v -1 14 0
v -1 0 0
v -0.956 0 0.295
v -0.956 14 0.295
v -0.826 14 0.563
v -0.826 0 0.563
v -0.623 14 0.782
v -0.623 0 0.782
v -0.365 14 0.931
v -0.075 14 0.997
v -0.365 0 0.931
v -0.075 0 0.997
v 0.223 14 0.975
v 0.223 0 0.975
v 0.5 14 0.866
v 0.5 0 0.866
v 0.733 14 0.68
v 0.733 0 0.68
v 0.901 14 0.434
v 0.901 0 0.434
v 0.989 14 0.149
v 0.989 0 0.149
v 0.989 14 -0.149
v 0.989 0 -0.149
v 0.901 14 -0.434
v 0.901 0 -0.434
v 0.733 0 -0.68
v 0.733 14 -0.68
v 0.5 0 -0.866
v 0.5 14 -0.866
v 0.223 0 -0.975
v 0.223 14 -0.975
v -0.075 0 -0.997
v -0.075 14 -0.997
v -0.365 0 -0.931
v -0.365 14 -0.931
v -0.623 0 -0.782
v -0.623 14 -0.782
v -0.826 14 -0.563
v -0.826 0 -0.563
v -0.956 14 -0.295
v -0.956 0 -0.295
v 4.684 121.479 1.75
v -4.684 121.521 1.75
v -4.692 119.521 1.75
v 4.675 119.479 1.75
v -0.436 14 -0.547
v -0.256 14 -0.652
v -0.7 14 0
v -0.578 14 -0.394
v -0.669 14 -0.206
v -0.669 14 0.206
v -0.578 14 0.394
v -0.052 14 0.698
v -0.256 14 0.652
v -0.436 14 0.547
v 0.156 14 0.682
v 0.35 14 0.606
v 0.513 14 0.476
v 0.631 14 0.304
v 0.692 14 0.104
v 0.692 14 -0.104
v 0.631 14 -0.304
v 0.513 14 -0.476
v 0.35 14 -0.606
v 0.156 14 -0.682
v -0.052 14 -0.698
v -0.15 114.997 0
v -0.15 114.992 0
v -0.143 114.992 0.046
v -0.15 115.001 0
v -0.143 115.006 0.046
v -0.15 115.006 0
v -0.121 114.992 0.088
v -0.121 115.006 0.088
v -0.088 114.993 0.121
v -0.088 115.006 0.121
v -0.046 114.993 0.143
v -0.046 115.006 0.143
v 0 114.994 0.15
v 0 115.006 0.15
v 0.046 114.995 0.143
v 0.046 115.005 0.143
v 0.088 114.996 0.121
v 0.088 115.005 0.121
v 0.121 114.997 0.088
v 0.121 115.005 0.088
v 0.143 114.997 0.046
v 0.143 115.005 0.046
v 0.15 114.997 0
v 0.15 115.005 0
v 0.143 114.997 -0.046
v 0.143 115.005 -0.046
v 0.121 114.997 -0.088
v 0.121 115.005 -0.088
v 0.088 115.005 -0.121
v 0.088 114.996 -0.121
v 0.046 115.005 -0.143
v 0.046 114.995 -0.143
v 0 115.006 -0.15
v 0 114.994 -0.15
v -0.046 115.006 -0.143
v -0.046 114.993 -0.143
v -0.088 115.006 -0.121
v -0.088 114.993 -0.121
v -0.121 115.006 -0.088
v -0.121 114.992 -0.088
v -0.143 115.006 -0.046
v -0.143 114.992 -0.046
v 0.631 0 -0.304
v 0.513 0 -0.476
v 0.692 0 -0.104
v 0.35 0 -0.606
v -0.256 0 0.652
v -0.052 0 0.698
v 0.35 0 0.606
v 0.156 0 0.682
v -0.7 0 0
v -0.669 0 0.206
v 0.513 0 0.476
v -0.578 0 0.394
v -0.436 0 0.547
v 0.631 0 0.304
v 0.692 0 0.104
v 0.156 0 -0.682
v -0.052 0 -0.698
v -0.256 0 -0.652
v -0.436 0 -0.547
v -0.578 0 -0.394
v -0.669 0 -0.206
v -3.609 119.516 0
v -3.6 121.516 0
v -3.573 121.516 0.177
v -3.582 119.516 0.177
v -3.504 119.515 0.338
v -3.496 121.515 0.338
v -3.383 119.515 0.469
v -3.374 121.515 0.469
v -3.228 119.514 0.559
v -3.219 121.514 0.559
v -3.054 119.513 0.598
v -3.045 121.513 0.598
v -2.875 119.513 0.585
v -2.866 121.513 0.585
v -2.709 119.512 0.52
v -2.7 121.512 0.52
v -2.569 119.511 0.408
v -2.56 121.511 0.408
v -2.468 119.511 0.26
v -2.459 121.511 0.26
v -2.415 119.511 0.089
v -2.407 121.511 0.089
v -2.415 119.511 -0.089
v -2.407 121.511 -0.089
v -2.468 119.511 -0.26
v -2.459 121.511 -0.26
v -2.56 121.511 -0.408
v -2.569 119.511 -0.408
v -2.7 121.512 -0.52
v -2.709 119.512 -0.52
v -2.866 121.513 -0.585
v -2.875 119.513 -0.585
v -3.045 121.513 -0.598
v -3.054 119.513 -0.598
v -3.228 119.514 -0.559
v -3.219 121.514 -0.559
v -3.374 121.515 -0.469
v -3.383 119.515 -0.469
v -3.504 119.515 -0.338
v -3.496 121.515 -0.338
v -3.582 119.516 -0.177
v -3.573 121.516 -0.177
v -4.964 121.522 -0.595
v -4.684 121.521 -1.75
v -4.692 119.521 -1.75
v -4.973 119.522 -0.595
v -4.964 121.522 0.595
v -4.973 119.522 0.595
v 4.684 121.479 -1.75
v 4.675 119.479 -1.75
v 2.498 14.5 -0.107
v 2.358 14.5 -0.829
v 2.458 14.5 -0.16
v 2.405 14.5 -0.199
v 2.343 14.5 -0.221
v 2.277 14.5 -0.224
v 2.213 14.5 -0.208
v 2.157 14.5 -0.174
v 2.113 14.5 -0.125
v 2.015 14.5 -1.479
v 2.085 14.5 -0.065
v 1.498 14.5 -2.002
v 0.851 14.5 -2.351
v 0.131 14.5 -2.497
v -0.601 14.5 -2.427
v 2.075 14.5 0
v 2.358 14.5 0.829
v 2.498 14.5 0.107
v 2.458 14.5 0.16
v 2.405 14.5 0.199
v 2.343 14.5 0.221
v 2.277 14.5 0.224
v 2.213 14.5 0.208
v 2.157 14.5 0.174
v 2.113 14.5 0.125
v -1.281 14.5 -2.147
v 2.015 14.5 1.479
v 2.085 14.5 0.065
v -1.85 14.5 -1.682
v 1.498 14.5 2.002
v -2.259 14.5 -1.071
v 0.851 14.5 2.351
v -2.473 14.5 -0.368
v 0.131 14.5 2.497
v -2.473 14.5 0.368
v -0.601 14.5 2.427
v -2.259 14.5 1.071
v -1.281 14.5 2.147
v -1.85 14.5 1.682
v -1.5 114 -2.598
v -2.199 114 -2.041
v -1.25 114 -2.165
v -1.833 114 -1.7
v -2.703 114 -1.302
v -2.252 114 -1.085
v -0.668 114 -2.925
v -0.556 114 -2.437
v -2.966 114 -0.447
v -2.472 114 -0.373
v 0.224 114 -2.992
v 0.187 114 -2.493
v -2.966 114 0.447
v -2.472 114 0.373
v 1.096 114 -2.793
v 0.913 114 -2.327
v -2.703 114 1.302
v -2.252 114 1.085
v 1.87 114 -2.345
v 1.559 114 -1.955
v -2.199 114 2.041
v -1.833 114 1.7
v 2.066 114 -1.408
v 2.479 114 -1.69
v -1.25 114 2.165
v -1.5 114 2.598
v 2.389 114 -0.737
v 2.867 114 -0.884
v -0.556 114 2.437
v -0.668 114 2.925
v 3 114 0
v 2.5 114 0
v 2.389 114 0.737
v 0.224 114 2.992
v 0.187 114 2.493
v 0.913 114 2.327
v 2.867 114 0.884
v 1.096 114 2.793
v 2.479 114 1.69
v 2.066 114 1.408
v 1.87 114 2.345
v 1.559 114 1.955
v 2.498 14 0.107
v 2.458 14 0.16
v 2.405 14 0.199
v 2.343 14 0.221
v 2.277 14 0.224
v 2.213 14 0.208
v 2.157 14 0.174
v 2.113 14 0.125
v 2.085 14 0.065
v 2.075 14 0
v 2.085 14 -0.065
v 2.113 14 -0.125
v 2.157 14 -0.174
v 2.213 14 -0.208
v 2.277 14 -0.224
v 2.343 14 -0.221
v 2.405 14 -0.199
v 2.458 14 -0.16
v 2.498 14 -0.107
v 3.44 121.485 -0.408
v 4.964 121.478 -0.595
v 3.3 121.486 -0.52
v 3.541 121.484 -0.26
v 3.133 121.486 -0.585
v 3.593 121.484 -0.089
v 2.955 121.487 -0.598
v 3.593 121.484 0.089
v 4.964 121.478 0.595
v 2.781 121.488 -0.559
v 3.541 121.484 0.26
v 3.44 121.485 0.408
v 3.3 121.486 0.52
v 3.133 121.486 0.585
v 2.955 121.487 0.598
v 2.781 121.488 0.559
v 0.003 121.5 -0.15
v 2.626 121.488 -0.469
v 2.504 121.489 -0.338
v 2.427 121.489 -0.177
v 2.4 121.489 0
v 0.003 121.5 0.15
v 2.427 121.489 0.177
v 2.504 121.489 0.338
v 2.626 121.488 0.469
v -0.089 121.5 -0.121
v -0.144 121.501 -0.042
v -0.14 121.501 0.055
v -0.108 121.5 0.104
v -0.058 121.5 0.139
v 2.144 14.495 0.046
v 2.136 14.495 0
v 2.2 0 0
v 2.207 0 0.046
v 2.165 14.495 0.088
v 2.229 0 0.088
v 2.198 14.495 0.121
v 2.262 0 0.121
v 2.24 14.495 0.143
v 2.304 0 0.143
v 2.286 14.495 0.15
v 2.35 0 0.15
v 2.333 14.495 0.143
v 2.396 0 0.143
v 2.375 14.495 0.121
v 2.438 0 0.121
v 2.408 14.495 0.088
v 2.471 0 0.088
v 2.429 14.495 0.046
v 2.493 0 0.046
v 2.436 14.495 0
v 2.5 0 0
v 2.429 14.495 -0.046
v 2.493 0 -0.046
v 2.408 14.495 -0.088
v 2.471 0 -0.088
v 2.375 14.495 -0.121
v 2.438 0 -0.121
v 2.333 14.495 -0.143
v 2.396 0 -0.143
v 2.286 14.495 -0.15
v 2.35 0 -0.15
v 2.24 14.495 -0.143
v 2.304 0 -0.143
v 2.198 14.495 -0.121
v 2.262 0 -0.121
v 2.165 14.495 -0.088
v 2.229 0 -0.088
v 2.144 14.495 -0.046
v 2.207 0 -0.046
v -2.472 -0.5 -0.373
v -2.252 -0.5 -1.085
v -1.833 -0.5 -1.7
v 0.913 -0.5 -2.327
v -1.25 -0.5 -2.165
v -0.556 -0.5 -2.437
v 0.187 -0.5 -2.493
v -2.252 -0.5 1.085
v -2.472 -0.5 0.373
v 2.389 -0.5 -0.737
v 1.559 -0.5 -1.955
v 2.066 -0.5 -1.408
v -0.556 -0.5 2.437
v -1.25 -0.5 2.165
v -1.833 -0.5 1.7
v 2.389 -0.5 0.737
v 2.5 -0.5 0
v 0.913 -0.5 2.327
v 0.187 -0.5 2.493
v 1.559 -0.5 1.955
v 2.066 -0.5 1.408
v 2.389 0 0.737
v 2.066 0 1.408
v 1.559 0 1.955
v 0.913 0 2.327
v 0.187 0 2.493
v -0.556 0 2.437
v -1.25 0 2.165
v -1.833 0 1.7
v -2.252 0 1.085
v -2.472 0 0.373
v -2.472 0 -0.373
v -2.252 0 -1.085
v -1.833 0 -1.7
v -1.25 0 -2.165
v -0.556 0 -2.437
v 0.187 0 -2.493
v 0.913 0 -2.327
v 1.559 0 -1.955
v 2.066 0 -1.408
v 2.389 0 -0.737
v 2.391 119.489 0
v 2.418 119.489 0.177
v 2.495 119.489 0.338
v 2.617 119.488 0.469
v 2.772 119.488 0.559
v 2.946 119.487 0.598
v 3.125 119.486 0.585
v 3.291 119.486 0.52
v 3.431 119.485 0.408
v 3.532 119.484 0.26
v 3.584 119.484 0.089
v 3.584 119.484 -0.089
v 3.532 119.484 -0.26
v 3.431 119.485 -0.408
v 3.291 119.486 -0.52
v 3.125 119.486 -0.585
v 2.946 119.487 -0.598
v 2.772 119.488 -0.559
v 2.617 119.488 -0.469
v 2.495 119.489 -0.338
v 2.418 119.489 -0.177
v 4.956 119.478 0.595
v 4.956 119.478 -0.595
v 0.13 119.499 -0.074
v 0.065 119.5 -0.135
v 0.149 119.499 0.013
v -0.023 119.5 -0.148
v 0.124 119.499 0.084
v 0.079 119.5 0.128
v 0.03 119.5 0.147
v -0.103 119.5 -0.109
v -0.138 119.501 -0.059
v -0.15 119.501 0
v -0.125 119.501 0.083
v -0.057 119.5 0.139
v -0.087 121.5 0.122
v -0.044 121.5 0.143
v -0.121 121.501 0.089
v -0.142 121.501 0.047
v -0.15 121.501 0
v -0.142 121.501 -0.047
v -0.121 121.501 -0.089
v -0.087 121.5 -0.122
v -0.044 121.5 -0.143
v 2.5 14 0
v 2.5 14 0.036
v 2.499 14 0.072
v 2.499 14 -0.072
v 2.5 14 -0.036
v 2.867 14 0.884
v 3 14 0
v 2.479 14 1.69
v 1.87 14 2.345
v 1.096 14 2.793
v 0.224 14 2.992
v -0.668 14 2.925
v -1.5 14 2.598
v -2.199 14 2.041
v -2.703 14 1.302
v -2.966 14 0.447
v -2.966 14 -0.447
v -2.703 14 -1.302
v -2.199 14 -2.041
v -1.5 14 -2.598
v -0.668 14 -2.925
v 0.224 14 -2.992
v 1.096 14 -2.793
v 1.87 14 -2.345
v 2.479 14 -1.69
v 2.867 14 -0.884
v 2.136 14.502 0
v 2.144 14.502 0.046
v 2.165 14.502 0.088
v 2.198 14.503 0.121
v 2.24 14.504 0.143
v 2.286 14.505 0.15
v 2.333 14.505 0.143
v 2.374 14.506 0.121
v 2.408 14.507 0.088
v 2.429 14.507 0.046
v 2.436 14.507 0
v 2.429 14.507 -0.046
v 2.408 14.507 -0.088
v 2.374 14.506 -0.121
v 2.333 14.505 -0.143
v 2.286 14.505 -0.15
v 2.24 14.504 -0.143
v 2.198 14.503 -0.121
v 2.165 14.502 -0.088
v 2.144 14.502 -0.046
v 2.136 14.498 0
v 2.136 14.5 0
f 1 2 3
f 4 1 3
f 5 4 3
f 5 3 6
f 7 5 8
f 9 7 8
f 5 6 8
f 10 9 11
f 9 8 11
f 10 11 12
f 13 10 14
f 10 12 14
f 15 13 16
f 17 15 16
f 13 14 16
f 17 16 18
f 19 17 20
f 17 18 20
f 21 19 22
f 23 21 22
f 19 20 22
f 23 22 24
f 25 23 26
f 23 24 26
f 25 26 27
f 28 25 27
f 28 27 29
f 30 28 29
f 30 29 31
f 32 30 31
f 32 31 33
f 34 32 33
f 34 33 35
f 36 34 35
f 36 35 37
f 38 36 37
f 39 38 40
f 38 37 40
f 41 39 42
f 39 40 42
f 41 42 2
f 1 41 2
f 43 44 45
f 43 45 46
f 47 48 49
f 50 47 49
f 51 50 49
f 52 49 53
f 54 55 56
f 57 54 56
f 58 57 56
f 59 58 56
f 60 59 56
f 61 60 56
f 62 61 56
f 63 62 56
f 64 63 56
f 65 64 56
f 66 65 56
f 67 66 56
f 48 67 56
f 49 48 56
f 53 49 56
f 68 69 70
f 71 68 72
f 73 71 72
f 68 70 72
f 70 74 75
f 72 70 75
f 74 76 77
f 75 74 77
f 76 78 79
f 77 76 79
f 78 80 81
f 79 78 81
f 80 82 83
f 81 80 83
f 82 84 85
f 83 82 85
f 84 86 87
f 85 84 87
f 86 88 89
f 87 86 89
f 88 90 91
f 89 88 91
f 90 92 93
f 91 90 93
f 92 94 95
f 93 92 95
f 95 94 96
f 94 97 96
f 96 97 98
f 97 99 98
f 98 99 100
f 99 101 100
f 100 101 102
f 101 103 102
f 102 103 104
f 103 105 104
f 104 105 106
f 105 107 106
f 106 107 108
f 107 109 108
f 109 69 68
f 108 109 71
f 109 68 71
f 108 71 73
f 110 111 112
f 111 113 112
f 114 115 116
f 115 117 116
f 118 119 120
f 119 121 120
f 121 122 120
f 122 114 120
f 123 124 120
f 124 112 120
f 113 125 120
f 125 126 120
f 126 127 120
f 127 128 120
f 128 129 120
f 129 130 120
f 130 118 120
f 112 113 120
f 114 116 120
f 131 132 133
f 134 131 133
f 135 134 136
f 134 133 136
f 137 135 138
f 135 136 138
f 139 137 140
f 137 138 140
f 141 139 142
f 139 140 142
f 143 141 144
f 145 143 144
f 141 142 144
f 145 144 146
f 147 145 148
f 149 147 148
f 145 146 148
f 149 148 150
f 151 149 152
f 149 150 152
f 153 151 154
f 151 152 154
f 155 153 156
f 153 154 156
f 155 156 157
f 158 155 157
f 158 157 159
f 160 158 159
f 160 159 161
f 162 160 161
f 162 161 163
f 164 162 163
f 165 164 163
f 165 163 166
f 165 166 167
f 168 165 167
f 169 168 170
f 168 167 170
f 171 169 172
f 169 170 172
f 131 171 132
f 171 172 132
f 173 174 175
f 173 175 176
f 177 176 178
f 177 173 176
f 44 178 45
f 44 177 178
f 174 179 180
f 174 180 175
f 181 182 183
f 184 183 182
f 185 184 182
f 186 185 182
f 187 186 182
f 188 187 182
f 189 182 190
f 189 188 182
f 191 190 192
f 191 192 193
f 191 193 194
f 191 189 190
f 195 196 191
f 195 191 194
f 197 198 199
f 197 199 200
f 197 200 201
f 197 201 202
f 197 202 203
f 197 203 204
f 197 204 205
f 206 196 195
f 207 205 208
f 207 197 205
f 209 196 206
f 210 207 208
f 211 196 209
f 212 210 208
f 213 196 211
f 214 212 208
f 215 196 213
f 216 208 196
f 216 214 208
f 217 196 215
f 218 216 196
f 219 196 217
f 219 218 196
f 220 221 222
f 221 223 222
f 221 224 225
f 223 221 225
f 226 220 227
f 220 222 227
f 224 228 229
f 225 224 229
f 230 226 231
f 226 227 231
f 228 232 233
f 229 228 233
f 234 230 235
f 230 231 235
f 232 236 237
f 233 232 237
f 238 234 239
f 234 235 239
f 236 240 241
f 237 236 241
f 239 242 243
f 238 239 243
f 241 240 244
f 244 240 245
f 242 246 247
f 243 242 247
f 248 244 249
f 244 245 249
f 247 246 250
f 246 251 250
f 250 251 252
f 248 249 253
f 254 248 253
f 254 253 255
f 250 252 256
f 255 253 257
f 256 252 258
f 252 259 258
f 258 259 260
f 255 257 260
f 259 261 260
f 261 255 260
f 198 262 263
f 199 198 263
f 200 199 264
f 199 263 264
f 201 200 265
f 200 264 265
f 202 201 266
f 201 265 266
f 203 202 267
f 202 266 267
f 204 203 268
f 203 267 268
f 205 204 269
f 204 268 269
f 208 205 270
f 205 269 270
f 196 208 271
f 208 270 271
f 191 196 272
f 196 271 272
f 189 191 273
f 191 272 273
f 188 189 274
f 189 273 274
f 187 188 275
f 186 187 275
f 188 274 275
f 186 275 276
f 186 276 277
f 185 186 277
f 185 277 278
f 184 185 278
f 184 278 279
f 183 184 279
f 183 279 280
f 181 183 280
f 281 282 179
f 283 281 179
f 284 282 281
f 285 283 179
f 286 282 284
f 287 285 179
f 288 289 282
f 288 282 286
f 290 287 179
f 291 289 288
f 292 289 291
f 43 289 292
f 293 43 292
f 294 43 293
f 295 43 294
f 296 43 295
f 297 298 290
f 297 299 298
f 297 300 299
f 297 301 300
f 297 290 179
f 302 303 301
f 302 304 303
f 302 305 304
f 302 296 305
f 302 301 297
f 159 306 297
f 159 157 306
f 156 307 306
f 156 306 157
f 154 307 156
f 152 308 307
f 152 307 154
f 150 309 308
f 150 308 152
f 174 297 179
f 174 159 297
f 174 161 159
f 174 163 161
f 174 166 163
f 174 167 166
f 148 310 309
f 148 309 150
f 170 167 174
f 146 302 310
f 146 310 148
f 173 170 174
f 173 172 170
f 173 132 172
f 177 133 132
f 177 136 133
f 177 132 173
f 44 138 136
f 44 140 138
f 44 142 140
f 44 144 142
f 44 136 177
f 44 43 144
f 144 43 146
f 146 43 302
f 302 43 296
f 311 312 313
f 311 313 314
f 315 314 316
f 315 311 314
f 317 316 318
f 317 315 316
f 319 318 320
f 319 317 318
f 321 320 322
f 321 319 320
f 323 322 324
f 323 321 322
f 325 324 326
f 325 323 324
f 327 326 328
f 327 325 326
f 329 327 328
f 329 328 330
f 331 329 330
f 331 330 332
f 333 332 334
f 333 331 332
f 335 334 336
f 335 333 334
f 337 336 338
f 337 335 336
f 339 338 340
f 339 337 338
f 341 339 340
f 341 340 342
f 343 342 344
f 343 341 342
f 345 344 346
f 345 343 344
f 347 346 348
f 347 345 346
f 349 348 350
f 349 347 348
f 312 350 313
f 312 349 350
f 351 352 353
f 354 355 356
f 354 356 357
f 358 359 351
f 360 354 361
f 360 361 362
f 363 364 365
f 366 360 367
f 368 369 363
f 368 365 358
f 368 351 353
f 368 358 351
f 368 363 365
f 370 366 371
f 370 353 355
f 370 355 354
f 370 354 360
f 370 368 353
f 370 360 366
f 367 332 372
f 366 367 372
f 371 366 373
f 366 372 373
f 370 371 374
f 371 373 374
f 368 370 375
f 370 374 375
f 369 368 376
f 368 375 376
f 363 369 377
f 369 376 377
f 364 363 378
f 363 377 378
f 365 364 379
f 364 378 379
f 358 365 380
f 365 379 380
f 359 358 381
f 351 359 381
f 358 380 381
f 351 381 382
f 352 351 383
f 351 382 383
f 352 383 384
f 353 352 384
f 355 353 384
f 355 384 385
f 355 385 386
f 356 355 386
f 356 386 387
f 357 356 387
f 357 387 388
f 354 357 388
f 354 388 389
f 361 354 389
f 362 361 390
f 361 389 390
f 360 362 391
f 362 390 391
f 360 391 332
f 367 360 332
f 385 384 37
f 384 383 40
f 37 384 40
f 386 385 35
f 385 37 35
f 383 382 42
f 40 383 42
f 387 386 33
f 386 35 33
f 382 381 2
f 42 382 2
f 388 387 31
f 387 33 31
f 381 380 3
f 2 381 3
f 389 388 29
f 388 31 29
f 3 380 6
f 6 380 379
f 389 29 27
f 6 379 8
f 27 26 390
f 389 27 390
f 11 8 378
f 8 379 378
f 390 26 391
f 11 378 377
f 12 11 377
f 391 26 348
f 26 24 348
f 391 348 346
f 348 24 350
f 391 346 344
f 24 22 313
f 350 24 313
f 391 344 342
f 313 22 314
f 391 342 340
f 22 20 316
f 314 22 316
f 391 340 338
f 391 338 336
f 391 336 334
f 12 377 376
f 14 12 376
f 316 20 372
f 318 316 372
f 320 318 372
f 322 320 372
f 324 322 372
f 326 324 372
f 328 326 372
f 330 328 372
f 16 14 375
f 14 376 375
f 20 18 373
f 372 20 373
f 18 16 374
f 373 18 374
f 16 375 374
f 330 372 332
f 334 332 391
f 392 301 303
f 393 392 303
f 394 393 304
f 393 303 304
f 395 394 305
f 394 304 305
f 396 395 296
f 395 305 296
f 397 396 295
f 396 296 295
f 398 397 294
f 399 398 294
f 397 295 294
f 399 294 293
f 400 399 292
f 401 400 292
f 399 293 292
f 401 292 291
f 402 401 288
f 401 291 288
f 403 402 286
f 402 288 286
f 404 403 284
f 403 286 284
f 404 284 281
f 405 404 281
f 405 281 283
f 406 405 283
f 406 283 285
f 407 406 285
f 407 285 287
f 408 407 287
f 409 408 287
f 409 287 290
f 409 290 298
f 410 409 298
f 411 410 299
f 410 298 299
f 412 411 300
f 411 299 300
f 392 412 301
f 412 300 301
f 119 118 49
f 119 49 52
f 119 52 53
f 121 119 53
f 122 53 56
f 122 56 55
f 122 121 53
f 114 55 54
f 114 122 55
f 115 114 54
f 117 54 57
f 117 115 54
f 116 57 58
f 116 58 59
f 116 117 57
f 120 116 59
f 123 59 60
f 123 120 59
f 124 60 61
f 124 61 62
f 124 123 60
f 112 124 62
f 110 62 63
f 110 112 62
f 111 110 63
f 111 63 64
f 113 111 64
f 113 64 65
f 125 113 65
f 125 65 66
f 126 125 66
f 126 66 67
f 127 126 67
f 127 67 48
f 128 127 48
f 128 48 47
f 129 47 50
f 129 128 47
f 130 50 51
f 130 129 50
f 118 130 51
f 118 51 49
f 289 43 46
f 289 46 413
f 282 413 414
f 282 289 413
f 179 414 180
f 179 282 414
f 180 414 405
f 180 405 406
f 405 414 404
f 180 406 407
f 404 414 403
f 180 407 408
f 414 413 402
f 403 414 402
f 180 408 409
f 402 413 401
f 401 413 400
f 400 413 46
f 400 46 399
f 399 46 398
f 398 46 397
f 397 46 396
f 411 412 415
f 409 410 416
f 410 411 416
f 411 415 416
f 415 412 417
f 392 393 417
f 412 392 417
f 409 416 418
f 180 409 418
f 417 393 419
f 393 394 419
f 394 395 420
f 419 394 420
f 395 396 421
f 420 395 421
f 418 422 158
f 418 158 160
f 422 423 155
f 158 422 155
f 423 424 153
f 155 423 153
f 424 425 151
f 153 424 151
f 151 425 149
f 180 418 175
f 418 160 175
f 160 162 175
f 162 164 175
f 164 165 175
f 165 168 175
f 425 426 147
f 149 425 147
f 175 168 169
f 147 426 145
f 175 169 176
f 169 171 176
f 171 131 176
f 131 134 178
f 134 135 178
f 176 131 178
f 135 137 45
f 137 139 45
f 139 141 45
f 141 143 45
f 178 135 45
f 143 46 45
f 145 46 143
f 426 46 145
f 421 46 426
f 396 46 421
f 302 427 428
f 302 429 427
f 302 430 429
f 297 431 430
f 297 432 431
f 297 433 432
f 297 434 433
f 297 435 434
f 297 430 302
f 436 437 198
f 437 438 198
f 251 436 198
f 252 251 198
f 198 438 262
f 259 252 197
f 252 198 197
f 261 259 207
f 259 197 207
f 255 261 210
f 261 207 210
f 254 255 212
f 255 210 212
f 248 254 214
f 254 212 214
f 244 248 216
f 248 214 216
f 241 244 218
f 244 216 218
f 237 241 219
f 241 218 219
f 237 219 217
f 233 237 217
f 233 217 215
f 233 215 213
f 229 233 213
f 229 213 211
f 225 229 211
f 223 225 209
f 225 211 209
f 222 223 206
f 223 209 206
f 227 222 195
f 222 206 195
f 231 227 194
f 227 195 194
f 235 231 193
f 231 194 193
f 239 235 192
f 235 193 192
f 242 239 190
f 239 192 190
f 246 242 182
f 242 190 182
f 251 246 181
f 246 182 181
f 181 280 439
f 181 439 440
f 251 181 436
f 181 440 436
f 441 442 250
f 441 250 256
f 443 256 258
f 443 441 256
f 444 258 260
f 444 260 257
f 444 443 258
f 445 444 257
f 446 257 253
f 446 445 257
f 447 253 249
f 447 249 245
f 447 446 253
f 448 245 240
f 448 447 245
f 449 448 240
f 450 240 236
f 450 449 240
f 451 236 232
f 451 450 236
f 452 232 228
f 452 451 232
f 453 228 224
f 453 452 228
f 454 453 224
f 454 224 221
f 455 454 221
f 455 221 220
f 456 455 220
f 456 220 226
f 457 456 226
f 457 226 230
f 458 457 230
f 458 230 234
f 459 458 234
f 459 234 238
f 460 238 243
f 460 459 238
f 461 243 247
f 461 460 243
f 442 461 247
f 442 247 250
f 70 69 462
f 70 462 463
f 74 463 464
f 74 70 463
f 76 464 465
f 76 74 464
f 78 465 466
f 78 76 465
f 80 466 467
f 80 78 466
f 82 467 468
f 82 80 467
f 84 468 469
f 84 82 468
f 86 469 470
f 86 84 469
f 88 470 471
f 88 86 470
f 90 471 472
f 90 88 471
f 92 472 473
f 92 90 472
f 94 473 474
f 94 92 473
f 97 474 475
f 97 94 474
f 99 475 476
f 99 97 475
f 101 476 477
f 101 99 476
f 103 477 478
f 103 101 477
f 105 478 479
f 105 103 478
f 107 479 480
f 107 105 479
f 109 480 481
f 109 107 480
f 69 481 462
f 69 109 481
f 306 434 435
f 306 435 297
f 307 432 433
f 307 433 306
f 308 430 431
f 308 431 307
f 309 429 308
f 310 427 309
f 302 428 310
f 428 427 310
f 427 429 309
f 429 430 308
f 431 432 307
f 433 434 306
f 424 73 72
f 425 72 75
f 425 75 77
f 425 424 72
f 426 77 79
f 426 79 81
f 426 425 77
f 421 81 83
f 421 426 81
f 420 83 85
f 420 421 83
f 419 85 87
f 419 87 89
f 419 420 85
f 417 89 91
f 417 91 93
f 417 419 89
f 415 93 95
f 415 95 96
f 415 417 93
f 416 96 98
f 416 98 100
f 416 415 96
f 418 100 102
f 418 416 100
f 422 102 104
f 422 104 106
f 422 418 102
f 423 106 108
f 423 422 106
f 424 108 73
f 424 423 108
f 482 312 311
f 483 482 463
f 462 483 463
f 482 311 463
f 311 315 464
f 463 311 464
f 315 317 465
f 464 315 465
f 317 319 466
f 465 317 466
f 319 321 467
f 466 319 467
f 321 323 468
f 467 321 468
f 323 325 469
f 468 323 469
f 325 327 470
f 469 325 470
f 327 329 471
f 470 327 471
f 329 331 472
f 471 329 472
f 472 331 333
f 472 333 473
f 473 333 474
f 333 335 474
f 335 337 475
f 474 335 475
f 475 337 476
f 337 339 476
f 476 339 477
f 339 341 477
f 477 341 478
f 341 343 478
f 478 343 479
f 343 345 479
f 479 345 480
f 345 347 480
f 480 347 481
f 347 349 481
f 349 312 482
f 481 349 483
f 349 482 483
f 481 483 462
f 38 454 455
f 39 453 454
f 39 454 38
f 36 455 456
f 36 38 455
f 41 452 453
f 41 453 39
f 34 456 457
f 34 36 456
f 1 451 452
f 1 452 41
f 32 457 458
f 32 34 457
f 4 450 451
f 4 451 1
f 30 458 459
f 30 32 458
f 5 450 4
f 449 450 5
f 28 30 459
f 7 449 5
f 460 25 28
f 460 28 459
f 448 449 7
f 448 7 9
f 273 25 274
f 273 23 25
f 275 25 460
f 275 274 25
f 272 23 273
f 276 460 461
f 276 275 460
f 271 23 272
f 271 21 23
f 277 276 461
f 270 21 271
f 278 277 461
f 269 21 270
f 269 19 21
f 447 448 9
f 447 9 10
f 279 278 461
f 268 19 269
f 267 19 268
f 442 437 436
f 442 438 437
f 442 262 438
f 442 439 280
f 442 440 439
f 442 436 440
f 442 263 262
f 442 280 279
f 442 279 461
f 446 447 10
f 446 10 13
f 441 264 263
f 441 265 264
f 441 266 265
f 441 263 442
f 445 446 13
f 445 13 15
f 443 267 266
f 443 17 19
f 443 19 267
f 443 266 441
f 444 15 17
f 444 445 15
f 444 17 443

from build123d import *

# Parameters (mm, degrees)
F0_R      = 2.5
F1_DEPTH  = 0.5
F2_R      = 1
F2_R_2    = 0.7
F3_DEPTH  = 14
F5_DEPTH  = 0.5
F6_R      = 0.15
F7_R      = 3
F7_R_2    = 2.5
F10_DEPTH = 100
F11_R     = 0.6
F12_DEPTH = 2


with BuildPart() as f1:
    # F0 (on Front) → F1 (new body)
    with BuildSketch(Plane.XZ):
        Circle(F0_R)
    extrude(amount=F1_DEPTH)

    # F2 (on face) → F3 (join)
    with BuildSketch(Plane(origin=(0, 0, 0), x_dir=(-1, 0, 0), z_dir=(0, 1, 0))):
        Circle(F2_R)
        Circle(F2_R_2, mode=Mode.SUBTRACT)
    extrude(amount=F3_DEPTH)

    # F4 (on face) → F5 (join)
    with BuildSketch(Plane(origin=(0, 14, 0), x_dir=(-1, 0, 0), z_dir=(0, 1, 0))):
        with BuildLine():
            ThreePointArc((-2.49769, 0.107441), (-2.075, 0), (-2.49769, -0.107441))
            ThreePointArc((-2.49769, -0.107441), (2.5, 0), (-2.49769, 0.107441))
        make_face()
    extrude(amount=F5_DEPTH)

    # F9: sweep along a path in F8
    with BuildLine(Plane.XY) as f9_path:
        Line((2.35, 0), (2.286365, 14.495411))
        ThreePointArc((2.286365, 14.495411), (2.286324, 14.5), (2.286241, 14.504588))
        Line((2.286241, 14.504588), (0.000129, 114.994315))
        ThreePointArc((0.000129, 114.994315), (3.2e-05, 115), (0, 115.005687))
        Line((0, 115.005687), (0, 121.5))
    # F6 (on face) → F9 (sweep)
    with BuildSketch(Plane(origin=(0, 0, 0), x_dir=(-1, 0, 0), z_dir=(0, 1, 0))):
        with Locations((-2.35, 0)):
            Circle(F6_R)
    sweep(path=f9_path.line)

    # F7 (on face) → F10 (join)
    with BuildSketch(Plane.XZ.offset(-14)):
        Circle(F7_R)
        Circle(F7_R_2, mode=Mode.SUBTRACT)
    extrude(amount=-F10_DEPTH)

    # F11 (on face) → F12 (join)
    with BuildSketch(Plane(origin=(0.533374, 121.497658, 0), x_dir=(-0.99999, 0.00439, 0), z_dir=(0.00439, 0.99999, 0))):
        with BuildLine():
            Line((5.217127, 1.75), (-4.15037, 1.75))
            ThreePointArc((-4.15037, 1.75), (-4.466621, 0), (-4.15037, -1.75))
            Line((-4.15037, -1.75), (5.217127, -1.75))
            ThreePointArc((5.217127, -1.75), (5.533379, 0), (5.217127, 1.75))
        make_face()
        with Locations((-2.466621, 0)):
            Circle(F11_R, mode=Mode.SUBTRACT)
        with Locations((3.533379, 0)):
            Circle(F11_R, mode=Mode.SUBTRACT)
    extrude(amount=-F12_DEPTH)


solid = f1.part
